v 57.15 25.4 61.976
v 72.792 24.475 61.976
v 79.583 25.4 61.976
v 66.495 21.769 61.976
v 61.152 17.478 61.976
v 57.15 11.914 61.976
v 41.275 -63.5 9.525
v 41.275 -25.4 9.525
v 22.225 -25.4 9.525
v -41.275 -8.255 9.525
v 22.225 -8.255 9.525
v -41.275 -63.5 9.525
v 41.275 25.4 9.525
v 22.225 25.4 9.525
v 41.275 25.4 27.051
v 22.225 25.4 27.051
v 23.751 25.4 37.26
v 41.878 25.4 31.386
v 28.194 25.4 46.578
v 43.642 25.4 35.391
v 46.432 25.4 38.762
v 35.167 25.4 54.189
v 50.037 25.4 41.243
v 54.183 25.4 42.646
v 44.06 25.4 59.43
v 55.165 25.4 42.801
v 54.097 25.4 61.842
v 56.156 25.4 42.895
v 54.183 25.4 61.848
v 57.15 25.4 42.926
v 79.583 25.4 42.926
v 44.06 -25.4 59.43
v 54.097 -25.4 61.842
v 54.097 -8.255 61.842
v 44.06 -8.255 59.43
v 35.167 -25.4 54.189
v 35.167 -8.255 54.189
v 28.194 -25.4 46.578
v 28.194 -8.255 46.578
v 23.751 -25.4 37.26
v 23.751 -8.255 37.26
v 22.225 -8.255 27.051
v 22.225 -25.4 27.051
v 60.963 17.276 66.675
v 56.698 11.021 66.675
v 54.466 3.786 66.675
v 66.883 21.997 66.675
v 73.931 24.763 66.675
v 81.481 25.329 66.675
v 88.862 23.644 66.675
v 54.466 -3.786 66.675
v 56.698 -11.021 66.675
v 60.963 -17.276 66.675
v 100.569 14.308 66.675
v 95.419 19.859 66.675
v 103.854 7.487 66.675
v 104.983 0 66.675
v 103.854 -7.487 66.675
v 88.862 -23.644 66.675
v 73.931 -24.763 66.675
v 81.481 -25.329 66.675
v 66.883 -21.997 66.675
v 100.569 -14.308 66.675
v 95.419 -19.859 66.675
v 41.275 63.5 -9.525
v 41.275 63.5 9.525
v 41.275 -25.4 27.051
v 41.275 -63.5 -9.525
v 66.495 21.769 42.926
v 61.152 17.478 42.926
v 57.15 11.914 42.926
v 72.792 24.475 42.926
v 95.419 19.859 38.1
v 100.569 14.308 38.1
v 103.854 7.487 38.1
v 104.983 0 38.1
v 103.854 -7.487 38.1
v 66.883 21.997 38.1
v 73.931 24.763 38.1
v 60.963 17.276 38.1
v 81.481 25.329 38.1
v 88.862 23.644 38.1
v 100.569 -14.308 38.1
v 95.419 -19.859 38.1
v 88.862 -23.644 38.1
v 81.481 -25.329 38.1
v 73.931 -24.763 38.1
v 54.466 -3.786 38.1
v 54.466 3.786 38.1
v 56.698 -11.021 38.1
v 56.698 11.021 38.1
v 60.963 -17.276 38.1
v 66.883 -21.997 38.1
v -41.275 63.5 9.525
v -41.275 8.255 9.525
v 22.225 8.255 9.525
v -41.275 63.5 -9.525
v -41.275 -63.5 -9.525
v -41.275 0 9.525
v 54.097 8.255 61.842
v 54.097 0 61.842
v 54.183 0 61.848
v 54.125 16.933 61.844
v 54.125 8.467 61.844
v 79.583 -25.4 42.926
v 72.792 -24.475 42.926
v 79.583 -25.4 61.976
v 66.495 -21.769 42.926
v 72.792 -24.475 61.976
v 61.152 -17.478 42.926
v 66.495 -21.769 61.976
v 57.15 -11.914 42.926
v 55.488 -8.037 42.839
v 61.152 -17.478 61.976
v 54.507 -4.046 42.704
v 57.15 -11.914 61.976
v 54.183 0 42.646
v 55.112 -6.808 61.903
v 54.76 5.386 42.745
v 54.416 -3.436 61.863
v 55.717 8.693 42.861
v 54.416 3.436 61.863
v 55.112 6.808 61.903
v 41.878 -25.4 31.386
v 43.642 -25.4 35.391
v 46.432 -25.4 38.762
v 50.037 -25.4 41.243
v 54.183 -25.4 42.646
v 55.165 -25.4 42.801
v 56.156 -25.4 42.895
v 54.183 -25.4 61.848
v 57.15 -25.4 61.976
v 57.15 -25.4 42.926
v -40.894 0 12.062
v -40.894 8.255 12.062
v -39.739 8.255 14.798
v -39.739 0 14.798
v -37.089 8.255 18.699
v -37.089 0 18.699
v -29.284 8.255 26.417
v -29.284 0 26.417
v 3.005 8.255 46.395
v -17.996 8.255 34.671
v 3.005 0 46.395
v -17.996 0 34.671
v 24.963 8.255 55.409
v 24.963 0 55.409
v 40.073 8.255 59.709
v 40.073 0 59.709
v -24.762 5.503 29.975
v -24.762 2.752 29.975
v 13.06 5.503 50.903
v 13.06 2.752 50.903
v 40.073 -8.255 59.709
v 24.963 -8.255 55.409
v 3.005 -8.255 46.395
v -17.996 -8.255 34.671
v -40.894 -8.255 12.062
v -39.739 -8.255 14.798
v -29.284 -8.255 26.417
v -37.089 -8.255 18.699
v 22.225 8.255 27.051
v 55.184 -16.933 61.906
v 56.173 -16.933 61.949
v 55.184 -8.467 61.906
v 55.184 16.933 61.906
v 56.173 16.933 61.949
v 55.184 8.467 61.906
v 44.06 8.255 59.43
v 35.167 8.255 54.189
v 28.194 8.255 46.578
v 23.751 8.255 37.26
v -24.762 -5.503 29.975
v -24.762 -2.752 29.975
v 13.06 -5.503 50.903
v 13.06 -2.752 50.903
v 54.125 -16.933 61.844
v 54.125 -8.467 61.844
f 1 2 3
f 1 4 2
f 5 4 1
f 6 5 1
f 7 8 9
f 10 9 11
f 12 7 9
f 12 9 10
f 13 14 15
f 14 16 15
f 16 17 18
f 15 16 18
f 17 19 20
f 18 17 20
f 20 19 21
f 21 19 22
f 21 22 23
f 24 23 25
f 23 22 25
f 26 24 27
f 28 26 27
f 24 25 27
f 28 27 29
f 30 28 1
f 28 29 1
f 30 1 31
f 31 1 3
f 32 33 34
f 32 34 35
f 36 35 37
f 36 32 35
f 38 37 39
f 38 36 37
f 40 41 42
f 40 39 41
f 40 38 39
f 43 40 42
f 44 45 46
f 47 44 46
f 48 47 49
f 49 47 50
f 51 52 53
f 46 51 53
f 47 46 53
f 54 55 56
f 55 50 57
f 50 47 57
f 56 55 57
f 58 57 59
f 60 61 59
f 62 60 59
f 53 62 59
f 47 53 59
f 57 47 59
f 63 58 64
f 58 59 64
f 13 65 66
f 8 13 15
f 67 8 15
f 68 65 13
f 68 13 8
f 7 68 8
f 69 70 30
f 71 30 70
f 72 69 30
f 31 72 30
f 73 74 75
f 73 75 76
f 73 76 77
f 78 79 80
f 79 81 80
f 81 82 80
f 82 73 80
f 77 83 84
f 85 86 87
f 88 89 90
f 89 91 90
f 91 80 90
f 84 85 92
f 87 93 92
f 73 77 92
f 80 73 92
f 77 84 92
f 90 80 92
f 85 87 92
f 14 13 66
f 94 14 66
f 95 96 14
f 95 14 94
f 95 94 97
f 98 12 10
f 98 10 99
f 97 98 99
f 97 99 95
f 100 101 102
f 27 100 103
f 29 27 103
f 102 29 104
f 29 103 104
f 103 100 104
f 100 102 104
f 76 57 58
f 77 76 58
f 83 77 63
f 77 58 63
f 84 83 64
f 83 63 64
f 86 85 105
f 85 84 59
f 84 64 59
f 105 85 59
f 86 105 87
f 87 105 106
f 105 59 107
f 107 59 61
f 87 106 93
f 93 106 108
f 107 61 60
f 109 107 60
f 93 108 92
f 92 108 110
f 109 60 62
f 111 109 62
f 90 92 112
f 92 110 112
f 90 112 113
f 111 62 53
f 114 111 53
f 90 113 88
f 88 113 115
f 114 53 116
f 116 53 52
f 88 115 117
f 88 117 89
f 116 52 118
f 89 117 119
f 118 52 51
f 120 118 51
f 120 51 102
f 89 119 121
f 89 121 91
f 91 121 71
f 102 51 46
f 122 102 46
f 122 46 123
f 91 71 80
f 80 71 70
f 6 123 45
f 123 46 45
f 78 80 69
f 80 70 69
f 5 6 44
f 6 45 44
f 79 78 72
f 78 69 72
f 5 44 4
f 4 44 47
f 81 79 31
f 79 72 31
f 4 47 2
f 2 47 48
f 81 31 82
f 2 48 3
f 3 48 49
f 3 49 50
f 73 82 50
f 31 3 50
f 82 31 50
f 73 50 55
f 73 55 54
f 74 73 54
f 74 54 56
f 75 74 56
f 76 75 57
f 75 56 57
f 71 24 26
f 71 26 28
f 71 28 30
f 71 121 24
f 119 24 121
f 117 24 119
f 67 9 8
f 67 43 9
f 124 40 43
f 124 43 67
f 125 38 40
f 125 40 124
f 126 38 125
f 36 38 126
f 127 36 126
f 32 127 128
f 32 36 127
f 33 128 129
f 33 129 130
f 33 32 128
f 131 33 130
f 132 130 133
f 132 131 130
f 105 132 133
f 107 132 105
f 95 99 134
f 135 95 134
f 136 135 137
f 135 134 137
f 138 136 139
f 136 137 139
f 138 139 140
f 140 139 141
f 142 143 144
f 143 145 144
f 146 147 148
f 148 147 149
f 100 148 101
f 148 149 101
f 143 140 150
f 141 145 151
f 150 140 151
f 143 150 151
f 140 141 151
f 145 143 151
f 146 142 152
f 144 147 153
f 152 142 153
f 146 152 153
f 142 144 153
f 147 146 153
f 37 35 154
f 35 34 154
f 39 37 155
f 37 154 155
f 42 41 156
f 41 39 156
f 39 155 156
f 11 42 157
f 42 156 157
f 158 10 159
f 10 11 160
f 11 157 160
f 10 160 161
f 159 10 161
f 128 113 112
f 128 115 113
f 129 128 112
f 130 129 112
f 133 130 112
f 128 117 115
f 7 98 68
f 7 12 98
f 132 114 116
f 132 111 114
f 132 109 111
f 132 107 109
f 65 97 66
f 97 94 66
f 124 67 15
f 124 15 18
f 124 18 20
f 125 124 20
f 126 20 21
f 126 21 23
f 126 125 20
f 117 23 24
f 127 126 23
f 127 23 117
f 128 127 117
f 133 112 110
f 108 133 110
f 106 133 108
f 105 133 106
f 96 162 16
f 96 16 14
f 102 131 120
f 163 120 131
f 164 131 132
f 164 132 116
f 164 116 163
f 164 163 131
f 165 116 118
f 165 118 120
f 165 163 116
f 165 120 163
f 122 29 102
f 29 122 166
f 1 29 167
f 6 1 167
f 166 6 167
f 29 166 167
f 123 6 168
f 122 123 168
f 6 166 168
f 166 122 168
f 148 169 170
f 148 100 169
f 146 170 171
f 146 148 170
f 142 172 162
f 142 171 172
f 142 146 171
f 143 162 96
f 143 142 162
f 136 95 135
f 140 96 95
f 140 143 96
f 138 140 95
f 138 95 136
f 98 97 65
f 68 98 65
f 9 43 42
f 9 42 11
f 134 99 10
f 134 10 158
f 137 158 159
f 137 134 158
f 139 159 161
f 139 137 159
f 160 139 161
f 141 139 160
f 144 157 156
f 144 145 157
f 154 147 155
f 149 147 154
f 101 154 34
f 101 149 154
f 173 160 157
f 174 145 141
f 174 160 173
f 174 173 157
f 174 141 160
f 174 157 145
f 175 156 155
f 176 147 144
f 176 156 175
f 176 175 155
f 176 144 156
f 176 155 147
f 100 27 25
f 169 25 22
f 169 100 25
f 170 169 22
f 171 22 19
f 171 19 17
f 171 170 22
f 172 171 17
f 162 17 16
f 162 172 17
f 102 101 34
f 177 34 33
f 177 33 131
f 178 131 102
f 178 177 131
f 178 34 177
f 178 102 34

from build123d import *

# Parameters (mm, degrees)
F1_DEPTH = 63.5
F2_DEPTH = 25.4
F3_DEPTH = 8.255


with BuildPart() as f1:
    # F0 (on Front) → F1 (new body, symmetric)
    with BuildSketch(Plane.XZ):
        Polygon((-41.275, -9.525), (41.275, -9.525), (41.275, 9.525), (22.225, 9.525), (-41.275, 9.525), align=None)
    extrude(amount=F1_DEPTH, both=True)

    # F0 (on Front) → F2 (join, symmetric)
    with BuildSketch(Plane.XZ):
        with BuildLine():
            Line((22.225, 9.525), (41.275, 9.525))
            Line((41.275, 9.525), (41.275, 27.051))
            ThreePointArc((41.275, 27.051), (44.920476, 37.172974), (54.182636, 42.646204))
            Line((54.182636, 42.646204), (54.182636, 61.84799))
            add(Edge.make_bspline(
                [(54.096802, 61.842286), (54.125427, 61.844206), (54.154038, 61.846108), (54.182636, 61.84799)],
                knots=[108.458628, 108.458628, 108.458628, 108.458628, 108.543428, 108.543428, 108.543428, 108.543428], degree=3))
            ThreePointArc((54.096802, 61.842286), (31.397441, 50.642552), (22.225, 27.051))
            Line((22.225, 27.051), (22.225, 9.525))
        make_face()
        with BuildLine():
            Line((54.182636, 61.84799), (54.182636, 42.646204))
            ThreePointArc((54.182636, 42.646204), (55.659737, 42.855896), (57.15, 42.926))
            Line((57.15, 42.926), (73.837688, 42.926))
            Line((73.837688, 42.926), (79.582636, 42.926))
            Line((79.582636, 42.926), (79.582636, 61.976))
            Line((79.582636, 61.976), (73.837688, 61.976))
            Line((73.837688, 61.976), (57.15, 61.976))
            add(Edge.make_bspline(
                [(54.182636, 61.84799), (55.189281, 61.914258), (56.178968, 61.957255), (57.15, 61.976)],
                knots=[108.543428, 108.543428, 108.543428, 108.543428, 111.528418, 111.528418, 111.528418, 111.528418], degree=3))
        make_face()
    extrude(amount=F2_DEPTH, both=True)

    # F0 (on Front) → F3 (join, symmetric)
    with BuildSketch(Plane.XZ):
        with BuildLine():
            add(Edge.make_bspline(
                [(-41.275, 9.525), (-41.449575, 26.246032), (17.485724, 59.386473), (54.096802, 61.842286)],
                knots=[0, 0, 0, 0, 108.458628, 108.458628, 108.458628, 108.458628], degree=3))
            Line((-41.275, 9.525), (22.225, 9.525))
            Line((22.225, 9.525), (22.225, 27.051))
            ThreePointArc((22.225, 27.051), (31.397441, 50.642552), (54.096802, 61.842286))
        make_face()
    extrude(amount=F3_DEPTH, both=True)

    # F0 (on Front) → F4 (revolve)
    with BuildSketch(Plane.XZ):
        Polygon((79.582636, 42.926), (79.582636, 38.1), (104.982636, 38.1), (104.982636, 66.675), (79.582636, 66.675), (79.582636, 61.976), align=None)
    revolve(axis=Axis((79.582636, 0, 50.038), (0, 0, -1)))


solid = f1.part
